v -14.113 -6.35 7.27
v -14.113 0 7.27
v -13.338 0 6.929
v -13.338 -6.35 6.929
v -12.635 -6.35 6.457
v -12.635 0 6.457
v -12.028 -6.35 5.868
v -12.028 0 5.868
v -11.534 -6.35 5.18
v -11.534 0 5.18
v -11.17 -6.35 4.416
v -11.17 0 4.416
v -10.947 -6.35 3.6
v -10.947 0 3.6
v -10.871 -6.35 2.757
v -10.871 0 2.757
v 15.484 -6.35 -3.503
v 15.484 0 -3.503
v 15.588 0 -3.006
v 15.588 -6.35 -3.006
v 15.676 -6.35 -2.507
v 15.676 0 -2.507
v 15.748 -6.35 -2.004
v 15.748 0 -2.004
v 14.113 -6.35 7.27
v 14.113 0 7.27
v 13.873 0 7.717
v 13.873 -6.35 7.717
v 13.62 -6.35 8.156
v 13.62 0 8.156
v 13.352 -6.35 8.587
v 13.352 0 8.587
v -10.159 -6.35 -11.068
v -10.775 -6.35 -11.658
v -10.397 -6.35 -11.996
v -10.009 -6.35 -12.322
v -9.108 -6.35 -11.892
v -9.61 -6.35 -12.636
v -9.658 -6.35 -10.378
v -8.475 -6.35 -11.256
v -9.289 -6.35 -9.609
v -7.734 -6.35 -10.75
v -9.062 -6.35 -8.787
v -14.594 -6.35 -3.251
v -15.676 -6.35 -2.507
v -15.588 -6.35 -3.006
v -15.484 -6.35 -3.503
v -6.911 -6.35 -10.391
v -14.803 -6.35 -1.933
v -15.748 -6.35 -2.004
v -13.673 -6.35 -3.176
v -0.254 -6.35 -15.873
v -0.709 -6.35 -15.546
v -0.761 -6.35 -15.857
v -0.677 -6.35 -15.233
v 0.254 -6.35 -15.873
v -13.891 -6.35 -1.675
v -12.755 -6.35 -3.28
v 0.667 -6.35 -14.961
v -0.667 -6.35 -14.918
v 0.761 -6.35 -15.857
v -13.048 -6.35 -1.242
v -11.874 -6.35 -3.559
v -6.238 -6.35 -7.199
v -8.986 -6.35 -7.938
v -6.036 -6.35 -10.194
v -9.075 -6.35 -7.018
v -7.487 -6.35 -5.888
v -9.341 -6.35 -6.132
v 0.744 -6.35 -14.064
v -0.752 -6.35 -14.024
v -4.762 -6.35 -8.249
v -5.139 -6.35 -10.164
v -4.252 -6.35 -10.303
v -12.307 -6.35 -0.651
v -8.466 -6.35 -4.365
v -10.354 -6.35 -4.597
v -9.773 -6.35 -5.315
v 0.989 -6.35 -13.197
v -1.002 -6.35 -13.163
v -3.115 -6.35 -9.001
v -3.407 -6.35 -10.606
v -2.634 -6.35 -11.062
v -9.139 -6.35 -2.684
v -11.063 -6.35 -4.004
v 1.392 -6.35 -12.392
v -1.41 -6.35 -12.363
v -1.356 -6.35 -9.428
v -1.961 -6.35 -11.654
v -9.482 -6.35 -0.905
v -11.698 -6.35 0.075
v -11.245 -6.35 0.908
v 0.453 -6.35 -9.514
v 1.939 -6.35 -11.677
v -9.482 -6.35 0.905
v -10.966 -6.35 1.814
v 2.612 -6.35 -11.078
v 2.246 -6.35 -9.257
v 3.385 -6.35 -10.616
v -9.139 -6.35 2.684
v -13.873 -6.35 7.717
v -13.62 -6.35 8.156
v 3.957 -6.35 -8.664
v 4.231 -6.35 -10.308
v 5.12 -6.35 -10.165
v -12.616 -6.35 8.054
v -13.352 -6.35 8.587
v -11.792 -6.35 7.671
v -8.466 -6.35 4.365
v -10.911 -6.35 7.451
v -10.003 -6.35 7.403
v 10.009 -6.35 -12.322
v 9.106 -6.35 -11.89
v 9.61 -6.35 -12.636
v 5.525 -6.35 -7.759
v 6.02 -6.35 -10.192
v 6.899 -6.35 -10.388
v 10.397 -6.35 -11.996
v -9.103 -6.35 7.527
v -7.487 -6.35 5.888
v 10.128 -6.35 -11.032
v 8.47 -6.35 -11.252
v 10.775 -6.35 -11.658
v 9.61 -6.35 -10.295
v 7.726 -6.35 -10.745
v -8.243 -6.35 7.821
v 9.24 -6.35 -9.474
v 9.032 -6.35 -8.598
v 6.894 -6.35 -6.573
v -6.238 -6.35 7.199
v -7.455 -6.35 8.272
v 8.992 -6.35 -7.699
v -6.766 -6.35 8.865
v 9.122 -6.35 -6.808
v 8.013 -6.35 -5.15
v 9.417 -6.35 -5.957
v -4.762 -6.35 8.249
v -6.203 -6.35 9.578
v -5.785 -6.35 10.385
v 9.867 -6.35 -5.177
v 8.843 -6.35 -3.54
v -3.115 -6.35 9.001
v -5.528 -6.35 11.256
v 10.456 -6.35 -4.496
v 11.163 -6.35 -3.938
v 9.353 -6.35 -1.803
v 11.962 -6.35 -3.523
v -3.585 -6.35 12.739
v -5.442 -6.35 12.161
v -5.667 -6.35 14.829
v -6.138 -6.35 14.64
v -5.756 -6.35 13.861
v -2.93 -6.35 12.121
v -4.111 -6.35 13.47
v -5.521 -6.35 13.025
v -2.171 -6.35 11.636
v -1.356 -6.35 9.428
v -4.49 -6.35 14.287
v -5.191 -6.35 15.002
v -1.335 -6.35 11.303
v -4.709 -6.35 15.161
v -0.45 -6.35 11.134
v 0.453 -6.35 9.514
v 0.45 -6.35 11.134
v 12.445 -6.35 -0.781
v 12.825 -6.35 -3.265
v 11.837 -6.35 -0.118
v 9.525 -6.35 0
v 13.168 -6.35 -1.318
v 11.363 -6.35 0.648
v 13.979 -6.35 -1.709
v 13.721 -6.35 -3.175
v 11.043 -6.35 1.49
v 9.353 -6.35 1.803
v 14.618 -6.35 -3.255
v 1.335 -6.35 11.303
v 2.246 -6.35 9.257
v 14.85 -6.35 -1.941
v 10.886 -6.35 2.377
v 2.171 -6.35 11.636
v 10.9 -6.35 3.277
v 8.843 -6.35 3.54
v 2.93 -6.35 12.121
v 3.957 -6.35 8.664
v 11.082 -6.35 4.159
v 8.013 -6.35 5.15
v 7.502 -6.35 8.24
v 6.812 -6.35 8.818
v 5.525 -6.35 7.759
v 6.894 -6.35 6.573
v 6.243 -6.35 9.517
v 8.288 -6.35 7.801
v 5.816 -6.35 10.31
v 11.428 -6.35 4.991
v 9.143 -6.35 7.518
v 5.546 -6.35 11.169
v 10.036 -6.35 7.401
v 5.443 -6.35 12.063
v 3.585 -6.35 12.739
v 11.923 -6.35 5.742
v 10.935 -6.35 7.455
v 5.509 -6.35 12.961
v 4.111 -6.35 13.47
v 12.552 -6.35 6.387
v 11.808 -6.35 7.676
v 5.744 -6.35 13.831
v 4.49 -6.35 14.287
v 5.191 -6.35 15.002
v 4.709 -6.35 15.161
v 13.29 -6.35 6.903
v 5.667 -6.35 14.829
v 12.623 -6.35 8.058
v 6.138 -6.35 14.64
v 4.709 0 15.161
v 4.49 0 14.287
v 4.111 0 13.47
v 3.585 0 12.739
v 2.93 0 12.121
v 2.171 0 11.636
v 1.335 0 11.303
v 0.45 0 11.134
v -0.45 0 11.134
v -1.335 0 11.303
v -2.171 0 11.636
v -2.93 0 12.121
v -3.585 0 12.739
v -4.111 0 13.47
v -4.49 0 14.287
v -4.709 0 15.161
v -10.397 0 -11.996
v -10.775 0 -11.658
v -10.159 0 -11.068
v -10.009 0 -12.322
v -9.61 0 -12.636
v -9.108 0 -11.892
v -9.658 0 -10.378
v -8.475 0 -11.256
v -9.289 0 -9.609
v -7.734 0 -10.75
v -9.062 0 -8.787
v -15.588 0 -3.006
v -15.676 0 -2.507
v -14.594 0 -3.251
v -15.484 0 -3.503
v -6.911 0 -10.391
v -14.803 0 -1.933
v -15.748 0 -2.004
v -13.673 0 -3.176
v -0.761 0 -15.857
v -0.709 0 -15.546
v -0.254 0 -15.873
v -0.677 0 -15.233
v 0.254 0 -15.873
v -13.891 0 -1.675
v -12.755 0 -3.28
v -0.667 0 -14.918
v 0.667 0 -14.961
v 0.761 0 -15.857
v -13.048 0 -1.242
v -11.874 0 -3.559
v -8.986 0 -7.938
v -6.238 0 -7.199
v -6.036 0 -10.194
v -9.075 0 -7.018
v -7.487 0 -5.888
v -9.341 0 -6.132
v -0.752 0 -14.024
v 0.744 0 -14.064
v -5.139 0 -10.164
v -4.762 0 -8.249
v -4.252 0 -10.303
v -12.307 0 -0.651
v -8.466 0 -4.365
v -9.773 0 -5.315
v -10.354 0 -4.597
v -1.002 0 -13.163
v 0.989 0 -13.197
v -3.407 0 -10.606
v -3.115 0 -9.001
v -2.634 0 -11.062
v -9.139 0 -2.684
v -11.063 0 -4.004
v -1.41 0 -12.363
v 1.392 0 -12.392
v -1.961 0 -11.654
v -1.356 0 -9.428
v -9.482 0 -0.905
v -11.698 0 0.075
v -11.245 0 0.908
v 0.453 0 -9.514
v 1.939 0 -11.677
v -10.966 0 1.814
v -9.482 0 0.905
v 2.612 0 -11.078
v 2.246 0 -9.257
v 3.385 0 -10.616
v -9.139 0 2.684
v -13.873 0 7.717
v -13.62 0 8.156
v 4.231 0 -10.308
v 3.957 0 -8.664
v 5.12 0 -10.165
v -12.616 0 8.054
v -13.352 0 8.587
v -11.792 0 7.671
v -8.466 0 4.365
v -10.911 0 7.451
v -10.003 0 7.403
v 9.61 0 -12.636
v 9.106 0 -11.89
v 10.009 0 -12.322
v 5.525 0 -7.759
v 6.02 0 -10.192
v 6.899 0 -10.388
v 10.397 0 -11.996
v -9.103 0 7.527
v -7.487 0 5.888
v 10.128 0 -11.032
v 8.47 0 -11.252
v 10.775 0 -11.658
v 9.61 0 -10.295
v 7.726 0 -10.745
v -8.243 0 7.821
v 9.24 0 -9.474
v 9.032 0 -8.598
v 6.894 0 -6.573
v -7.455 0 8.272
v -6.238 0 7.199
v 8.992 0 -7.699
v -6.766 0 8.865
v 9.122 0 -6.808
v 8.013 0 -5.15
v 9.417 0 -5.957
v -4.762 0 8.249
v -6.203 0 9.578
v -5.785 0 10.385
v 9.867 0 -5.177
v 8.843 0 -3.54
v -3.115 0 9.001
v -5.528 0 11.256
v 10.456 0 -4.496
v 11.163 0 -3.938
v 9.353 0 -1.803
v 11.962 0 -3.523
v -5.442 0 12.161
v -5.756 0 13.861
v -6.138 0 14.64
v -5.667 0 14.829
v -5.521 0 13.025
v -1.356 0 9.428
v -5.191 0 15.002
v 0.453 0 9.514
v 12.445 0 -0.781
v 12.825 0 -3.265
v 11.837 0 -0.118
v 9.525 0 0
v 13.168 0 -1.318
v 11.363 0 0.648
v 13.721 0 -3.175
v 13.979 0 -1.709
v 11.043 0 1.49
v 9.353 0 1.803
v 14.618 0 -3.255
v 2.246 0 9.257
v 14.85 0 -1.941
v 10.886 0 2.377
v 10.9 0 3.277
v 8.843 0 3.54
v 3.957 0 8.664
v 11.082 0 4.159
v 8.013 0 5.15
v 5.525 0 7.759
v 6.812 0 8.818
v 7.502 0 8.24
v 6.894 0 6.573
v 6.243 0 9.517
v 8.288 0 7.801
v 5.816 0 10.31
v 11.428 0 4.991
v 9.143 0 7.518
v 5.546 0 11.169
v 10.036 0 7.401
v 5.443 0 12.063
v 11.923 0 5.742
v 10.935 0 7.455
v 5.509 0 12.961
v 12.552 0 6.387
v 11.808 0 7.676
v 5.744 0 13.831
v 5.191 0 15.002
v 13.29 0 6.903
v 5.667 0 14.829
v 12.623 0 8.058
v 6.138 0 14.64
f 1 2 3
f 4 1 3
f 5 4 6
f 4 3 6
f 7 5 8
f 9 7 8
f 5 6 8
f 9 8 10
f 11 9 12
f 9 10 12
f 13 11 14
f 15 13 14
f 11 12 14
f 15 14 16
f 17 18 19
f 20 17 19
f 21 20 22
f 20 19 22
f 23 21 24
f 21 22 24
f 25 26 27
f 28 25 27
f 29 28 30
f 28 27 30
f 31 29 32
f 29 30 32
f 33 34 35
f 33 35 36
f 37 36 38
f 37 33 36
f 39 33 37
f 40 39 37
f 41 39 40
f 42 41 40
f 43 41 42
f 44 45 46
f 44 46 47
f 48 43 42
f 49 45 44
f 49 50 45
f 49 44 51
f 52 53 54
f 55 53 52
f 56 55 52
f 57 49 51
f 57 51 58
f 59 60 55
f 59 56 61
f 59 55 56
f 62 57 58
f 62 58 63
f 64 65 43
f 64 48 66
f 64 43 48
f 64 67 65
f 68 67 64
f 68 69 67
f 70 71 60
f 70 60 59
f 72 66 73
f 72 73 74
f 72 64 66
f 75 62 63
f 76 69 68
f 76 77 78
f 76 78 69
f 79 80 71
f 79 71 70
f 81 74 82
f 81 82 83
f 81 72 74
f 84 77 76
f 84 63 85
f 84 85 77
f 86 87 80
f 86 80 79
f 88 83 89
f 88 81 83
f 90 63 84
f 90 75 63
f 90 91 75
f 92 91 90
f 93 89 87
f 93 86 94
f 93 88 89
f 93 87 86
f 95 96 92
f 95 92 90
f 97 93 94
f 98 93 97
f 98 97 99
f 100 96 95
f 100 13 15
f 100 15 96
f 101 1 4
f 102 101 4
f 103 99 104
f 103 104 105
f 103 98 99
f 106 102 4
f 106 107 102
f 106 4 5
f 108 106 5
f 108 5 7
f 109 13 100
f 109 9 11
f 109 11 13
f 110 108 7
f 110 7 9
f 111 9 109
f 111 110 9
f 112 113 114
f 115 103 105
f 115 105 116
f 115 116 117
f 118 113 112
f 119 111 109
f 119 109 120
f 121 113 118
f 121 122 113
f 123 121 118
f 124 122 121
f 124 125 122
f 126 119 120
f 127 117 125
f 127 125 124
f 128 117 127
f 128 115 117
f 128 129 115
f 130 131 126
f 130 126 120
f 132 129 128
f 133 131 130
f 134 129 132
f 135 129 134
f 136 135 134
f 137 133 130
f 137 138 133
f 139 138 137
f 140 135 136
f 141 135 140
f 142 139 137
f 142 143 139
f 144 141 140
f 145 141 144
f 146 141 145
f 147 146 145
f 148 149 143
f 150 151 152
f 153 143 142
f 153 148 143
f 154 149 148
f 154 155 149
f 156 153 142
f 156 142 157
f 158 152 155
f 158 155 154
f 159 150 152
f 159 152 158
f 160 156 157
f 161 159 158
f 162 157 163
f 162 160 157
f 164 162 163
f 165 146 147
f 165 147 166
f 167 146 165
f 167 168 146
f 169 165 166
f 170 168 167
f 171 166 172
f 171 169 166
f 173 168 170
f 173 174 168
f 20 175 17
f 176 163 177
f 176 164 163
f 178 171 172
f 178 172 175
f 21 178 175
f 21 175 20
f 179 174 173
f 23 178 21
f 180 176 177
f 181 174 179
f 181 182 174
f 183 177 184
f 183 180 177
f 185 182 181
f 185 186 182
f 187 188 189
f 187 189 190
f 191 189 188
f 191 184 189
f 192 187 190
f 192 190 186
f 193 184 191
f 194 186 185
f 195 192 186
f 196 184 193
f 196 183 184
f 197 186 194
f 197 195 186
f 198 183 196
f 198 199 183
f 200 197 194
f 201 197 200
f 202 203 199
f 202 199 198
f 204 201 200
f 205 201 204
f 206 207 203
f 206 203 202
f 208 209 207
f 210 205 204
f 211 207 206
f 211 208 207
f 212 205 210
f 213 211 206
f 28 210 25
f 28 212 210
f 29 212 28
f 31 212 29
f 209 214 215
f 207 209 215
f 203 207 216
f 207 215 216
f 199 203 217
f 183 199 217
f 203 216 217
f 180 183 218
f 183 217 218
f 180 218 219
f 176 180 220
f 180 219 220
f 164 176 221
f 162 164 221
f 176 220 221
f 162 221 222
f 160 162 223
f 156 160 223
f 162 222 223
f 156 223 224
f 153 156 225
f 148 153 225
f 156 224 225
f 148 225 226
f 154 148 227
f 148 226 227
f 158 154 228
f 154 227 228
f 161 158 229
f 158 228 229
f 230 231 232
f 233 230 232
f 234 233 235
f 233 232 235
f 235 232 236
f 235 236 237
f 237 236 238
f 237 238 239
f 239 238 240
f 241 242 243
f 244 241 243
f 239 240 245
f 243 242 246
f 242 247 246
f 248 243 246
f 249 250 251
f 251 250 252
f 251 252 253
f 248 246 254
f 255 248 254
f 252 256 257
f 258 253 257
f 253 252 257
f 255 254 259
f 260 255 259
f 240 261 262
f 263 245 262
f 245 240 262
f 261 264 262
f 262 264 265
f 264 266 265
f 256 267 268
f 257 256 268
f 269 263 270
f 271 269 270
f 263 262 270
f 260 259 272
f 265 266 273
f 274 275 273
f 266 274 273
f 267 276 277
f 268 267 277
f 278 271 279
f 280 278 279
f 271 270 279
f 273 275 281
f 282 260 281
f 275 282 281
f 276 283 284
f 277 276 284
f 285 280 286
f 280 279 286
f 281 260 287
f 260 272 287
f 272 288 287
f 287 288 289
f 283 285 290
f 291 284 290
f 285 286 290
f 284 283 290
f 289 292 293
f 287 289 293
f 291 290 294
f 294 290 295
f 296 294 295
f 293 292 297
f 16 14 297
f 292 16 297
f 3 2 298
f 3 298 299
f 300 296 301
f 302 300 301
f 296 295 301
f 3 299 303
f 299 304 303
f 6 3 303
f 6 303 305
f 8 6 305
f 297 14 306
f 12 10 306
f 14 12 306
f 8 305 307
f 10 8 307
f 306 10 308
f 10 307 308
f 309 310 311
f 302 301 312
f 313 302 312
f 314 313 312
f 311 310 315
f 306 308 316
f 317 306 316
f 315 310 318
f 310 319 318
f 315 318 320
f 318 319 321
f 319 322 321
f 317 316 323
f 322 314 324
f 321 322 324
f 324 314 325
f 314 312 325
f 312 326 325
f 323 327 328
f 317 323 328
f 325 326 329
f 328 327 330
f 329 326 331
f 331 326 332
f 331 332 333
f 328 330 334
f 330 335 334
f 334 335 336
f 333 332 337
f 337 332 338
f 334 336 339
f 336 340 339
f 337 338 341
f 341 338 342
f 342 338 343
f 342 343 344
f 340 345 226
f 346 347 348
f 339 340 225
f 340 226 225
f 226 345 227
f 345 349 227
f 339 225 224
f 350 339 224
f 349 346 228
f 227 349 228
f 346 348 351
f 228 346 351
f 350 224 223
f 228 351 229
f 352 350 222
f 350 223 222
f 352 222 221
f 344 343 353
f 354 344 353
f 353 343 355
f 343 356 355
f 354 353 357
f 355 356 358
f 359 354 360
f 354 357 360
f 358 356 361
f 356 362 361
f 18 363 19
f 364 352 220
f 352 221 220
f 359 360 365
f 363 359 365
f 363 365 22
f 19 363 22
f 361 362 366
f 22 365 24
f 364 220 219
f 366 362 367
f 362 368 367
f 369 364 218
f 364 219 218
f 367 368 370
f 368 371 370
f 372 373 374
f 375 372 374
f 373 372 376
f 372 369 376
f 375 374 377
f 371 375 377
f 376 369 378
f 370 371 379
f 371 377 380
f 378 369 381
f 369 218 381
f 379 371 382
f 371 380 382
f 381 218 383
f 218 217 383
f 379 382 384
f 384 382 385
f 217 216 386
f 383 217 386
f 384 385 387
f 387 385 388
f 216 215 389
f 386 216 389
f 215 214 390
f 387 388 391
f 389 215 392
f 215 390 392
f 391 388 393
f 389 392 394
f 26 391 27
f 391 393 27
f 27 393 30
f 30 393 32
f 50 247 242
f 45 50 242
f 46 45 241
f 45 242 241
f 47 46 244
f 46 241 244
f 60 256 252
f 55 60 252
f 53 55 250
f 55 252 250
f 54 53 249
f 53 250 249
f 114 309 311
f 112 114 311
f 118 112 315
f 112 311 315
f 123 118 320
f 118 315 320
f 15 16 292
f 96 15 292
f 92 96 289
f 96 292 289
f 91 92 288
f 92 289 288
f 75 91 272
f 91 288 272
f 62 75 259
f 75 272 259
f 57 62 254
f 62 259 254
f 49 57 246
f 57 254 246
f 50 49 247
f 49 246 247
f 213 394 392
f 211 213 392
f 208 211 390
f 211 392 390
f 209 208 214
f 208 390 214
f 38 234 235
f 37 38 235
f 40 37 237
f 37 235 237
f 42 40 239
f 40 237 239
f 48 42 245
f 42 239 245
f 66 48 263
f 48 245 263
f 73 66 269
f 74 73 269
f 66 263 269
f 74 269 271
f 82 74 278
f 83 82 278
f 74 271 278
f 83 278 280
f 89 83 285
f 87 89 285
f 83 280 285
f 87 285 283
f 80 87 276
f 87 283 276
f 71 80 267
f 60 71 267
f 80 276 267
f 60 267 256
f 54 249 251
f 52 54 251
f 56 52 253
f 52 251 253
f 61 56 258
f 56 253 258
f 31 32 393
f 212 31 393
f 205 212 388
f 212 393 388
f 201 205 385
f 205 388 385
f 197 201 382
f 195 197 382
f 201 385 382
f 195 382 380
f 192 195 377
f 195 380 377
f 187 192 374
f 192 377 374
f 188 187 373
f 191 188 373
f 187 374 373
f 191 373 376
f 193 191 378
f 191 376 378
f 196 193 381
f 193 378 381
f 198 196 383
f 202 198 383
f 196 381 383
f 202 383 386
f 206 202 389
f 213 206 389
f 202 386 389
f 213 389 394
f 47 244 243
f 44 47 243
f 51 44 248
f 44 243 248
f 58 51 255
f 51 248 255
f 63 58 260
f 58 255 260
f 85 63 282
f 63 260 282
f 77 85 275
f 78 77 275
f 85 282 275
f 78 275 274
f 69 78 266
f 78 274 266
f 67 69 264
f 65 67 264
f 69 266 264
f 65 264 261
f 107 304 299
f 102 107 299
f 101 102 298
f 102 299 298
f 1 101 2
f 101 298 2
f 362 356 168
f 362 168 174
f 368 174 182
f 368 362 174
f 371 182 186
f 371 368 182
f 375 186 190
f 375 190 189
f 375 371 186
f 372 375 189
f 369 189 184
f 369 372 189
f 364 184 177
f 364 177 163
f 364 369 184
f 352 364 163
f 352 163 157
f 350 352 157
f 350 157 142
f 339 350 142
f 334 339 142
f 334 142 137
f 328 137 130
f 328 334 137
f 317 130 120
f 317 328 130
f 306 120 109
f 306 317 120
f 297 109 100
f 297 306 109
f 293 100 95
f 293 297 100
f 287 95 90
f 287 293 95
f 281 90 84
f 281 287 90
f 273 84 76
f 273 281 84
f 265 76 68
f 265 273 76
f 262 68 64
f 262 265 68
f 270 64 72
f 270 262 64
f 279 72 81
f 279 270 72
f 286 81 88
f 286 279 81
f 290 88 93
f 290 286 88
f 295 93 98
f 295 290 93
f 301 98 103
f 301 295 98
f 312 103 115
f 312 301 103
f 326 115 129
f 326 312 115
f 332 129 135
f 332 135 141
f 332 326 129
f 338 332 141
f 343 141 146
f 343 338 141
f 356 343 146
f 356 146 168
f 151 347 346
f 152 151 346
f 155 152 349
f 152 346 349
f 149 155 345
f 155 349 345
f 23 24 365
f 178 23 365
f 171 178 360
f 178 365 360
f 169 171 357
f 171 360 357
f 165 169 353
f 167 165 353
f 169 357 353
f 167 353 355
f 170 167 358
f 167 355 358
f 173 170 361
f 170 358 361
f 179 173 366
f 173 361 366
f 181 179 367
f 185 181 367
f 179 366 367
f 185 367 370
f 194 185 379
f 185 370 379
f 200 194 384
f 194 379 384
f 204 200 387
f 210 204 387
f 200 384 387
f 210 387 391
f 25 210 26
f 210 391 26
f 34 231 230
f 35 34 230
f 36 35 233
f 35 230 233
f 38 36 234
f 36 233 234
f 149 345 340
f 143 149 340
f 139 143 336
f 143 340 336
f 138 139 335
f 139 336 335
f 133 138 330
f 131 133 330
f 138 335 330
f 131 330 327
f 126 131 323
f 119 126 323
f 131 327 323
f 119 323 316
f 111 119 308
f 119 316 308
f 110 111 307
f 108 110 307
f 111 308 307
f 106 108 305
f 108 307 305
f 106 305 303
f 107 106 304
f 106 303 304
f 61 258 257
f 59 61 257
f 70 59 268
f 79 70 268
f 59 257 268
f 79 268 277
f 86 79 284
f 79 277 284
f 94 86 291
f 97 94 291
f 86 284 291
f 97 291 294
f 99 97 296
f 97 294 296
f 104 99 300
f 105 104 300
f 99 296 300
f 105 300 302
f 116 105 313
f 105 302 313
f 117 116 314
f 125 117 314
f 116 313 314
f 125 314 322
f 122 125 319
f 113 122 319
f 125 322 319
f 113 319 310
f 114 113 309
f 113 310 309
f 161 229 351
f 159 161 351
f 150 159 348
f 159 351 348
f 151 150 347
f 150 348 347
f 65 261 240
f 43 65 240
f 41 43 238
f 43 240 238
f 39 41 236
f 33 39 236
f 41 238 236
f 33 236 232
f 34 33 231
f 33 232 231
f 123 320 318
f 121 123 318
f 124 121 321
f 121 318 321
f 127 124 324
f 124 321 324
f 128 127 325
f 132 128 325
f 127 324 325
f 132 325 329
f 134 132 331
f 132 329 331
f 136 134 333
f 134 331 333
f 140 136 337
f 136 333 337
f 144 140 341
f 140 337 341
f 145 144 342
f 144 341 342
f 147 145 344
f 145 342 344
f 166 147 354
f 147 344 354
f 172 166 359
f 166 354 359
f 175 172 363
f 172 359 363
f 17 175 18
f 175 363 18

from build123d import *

# Parameters (mm, degrees)
F0_R     = 9.525
F1_DEPTH = 6.35


with BuildPart() as f1:
    # F0 (on Front) → F1 (new body)
    with BuildSketch(Plane.XZ):
        with BuildLine():
            ThreePointArc((15.747944, -2.004468), (10.943676, 1.929665), (14.112658, 7.269697))
            ThreePointArc((14.112658, 7.269697), (13.748153, 7.9375), (13.352072, 8.587072))
            ThreePointArc((13.352072, 8.587072), (7.142977, 8.512669), (6.138052, 14.640353))
            ThreePointArc((6.138052, 14.640353), (5.42957, 14.91762), (4.708617, 15.160625))
            ThreePointArc((4.708617, 15.160625), (0, 11.1125), (-4.708617, 15.160625))
            ThreePointArc((-4.708617, 15.160625), (-5.42957, 14.91762), (-6.138052, 14.640353))
            ThreePointArc((-6.138052, 14.640353), (-5.619131, 13.448613), (-5.441753, 12.160956))
            ThreePointArc((-5.441753, 12.160956), (-8.243396, 7.820858), (-13.352072, 8.587072))
            ThreePointArc((-13.352072, 8.587072), (-13.748153, 7.9375), (-14.112658, 7.269697))
            ThreePointArc((-14.112658, 7.269697), (-11.765622, 5.534871), (-10.871323, 2.756665))
            ThreePointArc((-10.871323, 2.756665), (-12.306819, -0.65104), (-15.747944, -2.004468))
            ThreePointArc((-15.747944, -2.004468), (-15.633823, -2.756665), (-15.483795, -3.502531))
            ThreePointArc((-15.483795, -3.502531), (-11.063436, -4.003838), (-8.985653, -7.9375))
            ThreePointArc((-8.985653, -7.9375), (-9.456289, -10.001793), (-10.775178, -11.658094))
            ThreePointArc((-10.775178, -11.658094), (-10.204253, -12.160956), (-9.609892, -12.635886))
            ThreePointArc((-9.609892, -12.635886), (-4.252153, -10.302959), (-0.66707, -14.91762))
            ThreePointArc((-0.66707, -14.91762), (-0.690507, -15.389517), (-0.760586, -15.856769))
            ThreePointArc((-0.760586, -15.856769), (0, -15.875), (0.760586, -15.856769))
            ThreePointArc((0.760586, -15.856769), (3.800699, -10.442334), (9.609892, -12.635886))
            ThreePointArc((9.609892, -12.635886), (10.204253, -12.160956), (10.775178, -11.658094))
            ThreePointArc((10.775178, -11.658094), (9.623707, -5.55625), (15.483795, -3.502531))
            ThreePointArc((15.483795, -3.502531), (15.633823, -2.756665), (15.747944, -2.004468))
        make_face()
        Circle(F0_R, mode=Mode.SUBTRACT)
    extrude(amount=F1_DEPTH)


solid = f1.part
